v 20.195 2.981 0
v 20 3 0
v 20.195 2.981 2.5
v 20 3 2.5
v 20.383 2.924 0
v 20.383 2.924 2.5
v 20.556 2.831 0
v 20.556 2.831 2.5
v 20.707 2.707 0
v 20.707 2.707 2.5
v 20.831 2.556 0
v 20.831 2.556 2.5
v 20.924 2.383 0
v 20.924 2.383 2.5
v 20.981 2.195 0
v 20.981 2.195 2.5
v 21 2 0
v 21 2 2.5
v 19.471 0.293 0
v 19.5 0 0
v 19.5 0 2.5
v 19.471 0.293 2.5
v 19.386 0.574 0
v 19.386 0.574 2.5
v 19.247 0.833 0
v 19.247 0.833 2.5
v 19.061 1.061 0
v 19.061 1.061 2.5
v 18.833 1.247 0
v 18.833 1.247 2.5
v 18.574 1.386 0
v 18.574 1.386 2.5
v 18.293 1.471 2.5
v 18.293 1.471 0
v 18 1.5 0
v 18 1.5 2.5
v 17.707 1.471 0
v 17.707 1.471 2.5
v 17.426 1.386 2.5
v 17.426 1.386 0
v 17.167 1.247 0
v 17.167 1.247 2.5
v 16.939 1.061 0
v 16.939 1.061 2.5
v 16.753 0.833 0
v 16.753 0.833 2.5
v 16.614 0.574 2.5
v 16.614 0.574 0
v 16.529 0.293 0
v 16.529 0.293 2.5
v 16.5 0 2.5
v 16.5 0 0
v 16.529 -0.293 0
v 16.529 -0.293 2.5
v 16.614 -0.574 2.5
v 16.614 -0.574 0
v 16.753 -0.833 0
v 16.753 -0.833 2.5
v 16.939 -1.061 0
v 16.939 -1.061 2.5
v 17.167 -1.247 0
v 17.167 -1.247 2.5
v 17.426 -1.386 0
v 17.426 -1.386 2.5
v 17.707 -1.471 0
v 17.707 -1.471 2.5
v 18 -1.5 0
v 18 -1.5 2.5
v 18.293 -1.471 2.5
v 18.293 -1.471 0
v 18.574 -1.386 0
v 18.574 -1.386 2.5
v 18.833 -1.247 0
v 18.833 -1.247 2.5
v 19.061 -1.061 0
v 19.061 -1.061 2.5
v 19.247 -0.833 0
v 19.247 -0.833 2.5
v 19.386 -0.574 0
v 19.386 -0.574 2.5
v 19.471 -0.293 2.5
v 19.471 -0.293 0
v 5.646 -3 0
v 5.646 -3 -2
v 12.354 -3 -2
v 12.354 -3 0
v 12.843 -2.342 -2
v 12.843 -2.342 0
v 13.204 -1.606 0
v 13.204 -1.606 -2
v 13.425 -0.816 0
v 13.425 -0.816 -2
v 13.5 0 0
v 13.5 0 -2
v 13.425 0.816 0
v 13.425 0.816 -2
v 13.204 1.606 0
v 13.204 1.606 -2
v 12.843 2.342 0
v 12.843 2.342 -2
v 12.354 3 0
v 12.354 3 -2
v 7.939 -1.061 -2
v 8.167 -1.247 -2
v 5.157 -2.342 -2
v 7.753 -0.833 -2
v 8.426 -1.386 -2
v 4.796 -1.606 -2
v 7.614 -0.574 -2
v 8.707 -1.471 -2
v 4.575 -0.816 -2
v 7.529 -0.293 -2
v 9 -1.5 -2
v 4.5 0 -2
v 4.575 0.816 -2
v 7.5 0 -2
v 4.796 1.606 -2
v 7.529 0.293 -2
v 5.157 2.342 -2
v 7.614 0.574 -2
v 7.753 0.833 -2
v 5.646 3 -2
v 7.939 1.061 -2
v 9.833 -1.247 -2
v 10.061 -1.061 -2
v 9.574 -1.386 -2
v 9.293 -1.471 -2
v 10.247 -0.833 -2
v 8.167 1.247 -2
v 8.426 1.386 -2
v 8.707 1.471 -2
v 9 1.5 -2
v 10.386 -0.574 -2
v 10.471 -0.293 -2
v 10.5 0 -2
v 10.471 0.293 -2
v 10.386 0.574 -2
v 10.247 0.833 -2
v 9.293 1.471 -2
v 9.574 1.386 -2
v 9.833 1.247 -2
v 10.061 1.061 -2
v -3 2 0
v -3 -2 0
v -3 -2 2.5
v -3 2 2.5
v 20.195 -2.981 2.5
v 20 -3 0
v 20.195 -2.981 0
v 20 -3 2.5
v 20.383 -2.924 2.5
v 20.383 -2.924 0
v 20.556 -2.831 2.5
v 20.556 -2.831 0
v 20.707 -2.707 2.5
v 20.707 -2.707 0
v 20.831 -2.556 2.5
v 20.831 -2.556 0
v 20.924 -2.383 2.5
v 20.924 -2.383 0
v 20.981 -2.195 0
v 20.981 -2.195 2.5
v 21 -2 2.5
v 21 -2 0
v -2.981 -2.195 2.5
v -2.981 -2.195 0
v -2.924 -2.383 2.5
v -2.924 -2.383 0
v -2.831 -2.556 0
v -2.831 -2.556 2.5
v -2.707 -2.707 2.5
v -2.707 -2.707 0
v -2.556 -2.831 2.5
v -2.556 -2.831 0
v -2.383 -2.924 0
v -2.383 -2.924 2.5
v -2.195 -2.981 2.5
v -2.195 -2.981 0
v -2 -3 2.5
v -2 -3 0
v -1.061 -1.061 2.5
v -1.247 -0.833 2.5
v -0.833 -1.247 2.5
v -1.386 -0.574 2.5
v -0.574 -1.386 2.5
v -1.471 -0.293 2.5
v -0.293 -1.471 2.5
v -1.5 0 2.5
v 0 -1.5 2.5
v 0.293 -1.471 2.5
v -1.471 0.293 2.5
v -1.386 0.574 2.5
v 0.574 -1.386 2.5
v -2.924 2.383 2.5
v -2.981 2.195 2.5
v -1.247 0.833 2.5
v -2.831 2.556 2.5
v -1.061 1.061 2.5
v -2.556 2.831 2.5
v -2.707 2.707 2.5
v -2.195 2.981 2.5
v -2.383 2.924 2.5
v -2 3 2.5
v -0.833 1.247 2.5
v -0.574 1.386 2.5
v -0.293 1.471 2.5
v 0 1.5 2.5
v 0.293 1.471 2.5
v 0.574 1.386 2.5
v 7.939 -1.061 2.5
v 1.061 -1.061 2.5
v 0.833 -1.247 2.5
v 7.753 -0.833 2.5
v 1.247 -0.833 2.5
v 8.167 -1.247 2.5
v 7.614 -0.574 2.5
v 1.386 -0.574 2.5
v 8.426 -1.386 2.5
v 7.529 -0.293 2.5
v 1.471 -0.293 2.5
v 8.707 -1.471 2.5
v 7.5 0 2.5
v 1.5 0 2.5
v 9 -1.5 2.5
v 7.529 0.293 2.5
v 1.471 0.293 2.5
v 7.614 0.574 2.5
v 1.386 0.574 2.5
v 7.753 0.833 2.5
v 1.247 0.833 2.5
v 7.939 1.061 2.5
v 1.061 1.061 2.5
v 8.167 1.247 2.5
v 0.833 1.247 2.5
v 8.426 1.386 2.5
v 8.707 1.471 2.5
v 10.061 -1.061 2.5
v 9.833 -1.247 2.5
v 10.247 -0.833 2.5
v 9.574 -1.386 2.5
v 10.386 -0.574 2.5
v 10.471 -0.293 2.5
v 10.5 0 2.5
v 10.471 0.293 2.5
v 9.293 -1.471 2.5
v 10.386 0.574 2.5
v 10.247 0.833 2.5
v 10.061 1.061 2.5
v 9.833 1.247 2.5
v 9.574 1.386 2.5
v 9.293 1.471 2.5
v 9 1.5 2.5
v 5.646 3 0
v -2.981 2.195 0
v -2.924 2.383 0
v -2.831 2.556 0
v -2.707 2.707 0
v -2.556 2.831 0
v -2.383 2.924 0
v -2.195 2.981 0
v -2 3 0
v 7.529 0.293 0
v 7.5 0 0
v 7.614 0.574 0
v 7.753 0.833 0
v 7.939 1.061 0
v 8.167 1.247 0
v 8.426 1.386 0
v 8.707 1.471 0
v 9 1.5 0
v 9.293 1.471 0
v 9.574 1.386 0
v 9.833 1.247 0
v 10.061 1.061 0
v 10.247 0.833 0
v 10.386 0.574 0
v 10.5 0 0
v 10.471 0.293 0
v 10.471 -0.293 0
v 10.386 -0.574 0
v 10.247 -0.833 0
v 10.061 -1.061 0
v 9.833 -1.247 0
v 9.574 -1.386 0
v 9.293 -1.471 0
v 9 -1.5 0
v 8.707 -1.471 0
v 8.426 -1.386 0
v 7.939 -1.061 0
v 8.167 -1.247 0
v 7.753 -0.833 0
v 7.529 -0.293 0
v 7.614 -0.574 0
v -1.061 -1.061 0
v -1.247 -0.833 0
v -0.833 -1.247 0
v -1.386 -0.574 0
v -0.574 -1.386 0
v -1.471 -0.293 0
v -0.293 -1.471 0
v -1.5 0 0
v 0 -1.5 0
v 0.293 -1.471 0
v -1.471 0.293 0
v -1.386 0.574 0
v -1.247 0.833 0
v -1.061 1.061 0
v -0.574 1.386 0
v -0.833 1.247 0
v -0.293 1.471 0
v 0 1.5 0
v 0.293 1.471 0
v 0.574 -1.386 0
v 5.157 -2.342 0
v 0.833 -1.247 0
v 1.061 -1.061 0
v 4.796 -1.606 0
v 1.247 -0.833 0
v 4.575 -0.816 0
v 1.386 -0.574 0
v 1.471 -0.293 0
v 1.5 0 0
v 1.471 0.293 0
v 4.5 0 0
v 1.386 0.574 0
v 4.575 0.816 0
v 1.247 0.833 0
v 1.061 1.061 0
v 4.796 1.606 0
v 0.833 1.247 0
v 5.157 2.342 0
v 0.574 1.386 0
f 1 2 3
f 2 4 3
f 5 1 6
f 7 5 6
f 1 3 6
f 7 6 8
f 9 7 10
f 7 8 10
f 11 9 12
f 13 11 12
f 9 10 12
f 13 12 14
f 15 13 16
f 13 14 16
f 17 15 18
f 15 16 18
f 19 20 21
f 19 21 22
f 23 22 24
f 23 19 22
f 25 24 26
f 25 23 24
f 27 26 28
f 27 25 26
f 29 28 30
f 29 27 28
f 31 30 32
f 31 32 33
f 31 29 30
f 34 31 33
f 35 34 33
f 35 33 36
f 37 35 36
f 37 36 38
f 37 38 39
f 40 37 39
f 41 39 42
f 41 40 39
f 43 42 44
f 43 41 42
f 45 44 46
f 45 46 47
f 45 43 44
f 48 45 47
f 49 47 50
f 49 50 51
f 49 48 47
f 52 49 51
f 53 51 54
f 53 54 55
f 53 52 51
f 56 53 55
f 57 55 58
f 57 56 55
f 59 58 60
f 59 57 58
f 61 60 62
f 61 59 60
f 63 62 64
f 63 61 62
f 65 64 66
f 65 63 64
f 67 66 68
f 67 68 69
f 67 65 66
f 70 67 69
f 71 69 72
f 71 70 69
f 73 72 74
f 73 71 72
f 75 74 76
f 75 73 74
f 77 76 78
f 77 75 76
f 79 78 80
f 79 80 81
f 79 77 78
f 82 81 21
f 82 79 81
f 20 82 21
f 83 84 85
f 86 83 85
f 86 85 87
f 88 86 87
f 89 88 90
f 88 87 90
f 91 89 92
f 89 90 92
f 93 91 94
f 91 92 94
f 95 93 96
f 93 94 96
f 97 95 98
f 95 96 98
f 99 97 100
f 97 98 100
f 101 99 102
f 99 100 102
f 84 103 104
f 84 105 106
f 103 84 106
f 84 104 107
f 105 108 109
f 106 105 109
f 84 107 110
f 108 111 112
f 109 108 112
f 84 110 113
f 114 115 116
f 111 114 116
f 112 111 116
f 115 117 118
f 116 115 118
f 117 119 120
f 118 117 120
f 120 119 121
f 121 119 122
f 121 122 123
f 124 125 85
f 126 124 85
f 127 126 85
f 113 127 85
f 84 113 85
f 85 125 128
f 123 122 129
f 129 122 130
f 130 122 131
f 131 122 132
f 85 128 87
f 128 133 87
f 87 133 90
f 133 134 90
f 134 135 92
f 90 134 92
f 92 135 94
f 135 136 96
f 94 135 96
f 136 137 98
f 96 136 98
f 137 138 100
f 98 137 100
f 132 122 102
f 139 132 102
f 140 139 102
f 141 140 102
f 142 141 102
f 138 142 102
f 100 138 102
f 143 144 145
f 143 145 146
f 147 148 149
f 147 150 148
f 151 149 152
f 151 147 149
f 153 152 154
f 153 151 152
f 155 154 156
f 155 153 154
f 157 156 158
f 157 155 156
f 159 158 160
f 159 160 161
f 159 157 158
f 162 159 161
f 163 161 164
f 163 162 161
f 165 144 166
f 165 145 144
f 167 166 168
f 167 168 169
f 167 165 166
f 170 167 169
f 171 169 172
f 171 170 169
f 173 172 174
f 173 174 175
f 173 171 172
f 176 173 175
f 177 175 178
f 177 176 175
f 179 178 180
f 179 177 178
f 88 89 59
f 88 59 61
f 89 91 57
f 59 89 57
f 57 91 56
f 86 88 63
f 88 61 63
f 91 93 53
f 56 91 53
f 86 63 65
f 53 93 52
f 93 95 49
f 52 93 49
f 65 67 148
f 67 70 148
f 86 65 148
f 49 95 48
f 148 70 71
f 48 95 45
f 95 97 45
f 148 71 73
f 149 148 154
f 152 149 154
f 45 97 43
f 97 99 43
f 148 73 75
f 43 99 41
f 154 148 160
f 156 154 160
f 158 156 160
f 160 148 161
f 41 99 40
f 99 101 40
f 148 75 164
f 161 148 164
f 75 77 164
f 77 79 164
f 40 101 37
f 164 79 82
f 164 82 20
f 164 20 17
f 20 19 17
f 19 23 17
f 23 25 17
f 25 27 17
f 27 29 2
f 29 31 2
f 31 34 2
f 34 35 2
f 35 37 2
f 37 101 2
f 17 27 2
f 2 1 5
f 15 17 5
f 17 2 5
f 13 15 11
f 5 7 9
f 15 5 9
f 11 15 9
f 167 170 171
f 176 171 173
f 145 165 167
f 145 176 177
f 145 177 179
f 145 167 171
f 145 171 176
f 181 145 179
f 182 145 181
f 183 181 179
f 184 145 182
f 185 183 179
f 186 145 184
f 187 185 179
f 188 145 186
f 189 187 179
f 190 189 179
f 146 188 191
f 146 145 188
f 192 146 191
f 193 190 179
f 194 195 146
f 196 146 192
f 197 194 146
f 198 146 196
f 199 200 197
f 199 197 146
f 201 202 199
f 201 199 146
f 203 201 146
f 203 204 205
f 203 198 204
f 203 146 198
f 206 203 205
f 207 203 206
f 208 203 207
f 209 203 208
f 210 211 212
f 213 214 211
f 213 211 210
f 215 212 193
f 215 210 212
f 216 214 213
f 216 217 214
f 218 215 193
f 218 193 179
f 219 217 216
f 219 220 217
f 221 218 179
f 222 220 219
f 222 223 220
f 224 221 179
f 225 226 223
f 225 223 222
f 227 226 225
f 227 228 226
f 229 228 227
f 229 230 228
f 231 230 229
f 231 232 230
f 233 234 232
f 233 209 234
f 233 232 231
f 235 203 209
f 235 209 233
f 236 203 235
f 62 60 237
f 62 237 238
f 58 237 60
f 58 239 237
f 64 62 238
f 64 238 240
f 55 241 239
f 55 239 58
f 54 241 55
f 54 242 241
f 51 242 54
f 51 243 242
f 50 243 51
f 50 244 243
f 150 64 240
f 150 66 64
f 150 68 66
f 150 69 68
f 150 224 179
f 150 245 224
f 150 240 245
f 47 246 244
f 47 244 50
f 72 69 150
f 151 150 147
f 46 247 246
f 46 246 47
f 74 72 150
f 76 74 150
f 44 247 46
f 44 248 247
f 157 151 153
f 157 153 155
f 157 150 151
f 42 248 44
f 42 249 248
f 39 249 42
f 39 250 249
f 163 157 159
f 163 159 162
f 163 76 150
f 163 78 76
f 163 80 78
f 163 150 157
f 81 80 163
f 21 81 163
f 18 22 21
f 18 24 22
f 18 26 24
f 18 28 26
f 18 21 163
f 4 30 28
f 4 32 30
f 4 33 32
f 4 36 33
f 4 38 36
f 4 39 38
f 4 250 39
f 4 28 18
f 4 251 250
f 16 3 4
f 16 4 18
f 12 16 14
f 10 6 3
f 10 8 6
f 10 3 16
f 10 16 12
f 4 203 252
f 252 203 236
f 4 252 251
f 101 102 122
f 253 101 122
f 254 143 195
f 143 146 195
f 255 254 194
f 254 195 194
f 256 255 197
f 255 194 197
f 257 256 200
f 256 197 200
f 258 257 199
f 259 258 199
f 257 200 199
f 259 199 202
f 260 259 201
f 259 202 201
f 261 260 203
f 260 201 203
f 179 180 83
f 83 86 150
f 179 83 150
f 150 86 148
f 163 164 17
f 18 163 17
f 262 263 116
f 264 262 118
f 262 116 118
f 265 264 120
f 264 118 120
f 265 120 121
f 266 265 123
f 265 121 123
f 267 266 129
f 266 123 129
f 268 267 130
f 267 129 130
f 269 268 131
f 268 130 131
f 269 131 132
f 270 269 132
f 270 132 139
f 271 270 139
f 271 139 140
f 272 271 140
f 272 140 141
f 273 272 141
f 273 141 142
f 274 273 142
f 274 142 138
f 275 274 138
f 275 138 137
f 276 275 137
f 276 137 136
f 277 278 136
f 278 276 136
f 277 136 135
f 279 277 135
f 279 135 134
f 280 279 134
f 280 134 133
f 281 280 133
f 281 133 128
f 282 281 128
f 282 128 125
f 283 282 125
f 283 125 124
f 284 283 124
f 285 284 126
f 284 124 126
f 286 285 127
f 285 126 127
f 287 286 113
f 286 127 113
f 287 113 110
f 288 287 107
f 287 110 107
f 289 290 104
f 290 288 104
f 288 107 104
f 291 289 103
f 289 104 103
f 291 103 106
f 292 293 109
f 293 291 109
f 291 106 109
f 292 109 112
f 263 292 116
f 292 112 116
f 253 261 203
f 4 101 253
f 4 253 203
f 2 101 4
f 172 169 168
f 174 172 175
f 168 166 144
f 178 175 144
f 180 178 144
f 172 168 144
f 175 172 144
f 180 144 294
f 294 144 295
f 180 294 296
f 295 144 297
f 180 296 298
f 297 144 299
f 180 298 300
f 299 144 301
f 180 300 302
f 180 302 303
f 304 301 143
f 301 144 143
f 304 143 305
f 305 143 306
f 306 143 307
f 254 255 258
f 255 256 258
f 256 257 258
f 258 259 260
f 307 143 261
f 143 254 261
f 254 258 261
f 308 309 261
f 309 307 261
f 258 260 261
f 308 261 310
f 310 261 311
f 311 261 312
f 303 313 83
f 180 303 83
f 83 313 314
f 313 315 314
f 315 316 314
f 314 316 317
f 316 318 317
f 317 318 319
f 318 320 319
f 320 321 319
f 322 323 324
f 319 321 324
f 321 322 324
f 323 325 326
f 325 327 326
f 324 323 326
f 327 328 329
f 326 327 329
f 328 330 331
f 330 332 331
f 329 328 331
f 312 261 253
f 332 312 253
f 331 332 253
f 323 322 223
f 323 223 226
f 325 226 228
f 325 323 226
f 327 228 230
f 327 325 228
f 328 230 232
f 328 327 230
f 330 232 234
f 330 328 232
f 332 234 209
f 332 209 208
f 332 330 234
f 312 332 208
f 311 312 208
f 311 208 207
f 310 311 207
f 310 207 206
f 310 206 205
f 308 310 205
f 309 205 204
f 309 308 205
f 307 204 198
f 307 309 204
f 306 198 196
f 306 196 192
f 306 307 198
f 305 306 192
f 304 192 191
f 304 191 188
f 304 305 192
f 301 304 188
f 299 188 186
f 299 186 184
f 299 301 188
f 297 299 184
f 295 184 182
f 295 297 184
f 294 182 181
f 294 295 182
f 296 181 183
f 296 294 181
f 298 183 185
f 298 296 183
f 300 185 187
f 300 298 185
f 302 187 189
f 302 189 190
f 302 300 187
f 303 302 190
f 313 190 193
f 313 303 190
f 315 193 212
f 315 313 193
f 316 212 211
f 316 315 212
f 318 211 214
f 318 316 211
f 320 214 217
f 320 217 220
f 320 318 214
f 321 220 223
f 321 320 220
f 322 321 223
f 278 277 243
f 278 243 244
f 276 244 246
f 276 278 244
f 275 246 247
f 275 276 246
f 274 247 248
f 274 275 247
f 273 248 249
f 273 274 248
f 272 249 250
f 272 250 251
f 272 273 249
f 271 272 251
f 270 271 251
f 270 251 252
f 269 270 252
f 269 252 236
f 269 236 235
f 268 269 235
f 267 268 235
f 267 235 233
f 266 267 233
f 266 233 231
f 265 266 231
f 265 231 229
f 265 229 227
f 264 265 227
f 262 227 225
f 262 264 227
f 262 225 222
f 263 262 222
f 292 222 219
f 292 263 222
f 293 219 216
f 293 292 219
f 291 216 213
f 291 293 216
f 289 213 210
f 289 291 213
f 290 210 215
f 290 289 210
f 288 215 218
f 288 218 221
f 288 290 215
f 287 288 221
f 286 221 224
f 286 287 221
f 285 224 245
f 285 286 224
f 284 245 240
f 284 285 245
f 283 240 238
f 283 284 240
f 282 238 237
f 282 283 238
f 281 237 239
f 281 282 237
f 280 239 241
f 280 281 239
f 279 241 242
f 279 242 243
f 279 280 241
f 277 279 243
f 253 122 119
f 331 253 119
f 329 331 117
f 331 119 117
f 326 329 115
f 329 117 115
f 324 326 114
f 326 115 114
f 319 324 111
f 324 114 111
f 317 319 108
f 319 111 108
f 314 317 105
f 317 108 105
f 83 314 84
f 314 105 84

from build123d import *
from build123d.topology import SkipClean

# Parameters (mm, degrees)
SKETCH1_W           = 24
SKETCH1_H           = 6
SKETCH1_R           = 1.5
BOSS_EXTRUDE2_DEPTH = 2.5
FILLET1_R           = 1
FILLET2_R           = 1
BOSS_EXTRUDE3_START = 2
SKETCH2_R           = 1.5
BOSS_EXTRUDE3_DEPTH = 2


with BuildPart() as part:
    # Sketch1 → Boss-Extrude2 (new body)
    with BuildSketch(Plane.XY):
        with Locations((9, 0)):
            Rectangle(SKETCH1_W, SKETCH1_H)
        Circle(SKETCH1_R, mode=Mode.SUBTRACT)
        with Locations((9, 0)):
            Circle(SKETCH1_R, mode=Mode.SUBTRACT)
        with Locations((18, 0)):
            Circle(SKETCH1_R, mode=Mode.SUBTRACT)
    extrude(amount=BOSS_EXTRUDE2_DEPTH)

    # Fillet1
    fillet1_edges = [part.edges().sort_by_distance(p)[0] for p in [
        (-3, 3, 1.25),
    ]]
    fillet(fillet1_edges, radius=FILLET1_R)

    # Fillet2
    fillet2_edges = [part.edges().sort_by_distance(p)[0] for p in [
        (21, 3, 1.25),
        (21, -3, 1.25),
        (-3, -3, 1.25),
    ]]
    fillet(fillet2_edges, radius=FILLET2_R)

    # Sketch2 → Boss-Extrude3 (add)
    with SkipClean():  # the faces are left unmerged after this step: merging them gives an invalid solid
        with BuildSketch(Plane(origin=(0, 0, 0), x_dir=(-1, 0, 0), z_dir=(0, 0, -1)).offset(BOSS_EXTRUDE3_START)):
            with BuildLine():
                Line((-5.645898034, -3), (-12.354101966, -3))
                ThreePointArc((-12.354101966, -3), (-13.5, 0), (-12.354101966, 3))
                Line((-12.354101966, 3), (-5.645898034, 3))
                ThreePointArc((-5.645898034, 3), (-4.5, 0), (-5.645898034, -3))
            make_face()
            with Locations((-9, 0)):
                Circle(SKETCH2_R, mode=Mode.SUBTRACT)
        extrude(amount=-BOSS_EXTRUDE3_DEPTH)


solid = part.part
